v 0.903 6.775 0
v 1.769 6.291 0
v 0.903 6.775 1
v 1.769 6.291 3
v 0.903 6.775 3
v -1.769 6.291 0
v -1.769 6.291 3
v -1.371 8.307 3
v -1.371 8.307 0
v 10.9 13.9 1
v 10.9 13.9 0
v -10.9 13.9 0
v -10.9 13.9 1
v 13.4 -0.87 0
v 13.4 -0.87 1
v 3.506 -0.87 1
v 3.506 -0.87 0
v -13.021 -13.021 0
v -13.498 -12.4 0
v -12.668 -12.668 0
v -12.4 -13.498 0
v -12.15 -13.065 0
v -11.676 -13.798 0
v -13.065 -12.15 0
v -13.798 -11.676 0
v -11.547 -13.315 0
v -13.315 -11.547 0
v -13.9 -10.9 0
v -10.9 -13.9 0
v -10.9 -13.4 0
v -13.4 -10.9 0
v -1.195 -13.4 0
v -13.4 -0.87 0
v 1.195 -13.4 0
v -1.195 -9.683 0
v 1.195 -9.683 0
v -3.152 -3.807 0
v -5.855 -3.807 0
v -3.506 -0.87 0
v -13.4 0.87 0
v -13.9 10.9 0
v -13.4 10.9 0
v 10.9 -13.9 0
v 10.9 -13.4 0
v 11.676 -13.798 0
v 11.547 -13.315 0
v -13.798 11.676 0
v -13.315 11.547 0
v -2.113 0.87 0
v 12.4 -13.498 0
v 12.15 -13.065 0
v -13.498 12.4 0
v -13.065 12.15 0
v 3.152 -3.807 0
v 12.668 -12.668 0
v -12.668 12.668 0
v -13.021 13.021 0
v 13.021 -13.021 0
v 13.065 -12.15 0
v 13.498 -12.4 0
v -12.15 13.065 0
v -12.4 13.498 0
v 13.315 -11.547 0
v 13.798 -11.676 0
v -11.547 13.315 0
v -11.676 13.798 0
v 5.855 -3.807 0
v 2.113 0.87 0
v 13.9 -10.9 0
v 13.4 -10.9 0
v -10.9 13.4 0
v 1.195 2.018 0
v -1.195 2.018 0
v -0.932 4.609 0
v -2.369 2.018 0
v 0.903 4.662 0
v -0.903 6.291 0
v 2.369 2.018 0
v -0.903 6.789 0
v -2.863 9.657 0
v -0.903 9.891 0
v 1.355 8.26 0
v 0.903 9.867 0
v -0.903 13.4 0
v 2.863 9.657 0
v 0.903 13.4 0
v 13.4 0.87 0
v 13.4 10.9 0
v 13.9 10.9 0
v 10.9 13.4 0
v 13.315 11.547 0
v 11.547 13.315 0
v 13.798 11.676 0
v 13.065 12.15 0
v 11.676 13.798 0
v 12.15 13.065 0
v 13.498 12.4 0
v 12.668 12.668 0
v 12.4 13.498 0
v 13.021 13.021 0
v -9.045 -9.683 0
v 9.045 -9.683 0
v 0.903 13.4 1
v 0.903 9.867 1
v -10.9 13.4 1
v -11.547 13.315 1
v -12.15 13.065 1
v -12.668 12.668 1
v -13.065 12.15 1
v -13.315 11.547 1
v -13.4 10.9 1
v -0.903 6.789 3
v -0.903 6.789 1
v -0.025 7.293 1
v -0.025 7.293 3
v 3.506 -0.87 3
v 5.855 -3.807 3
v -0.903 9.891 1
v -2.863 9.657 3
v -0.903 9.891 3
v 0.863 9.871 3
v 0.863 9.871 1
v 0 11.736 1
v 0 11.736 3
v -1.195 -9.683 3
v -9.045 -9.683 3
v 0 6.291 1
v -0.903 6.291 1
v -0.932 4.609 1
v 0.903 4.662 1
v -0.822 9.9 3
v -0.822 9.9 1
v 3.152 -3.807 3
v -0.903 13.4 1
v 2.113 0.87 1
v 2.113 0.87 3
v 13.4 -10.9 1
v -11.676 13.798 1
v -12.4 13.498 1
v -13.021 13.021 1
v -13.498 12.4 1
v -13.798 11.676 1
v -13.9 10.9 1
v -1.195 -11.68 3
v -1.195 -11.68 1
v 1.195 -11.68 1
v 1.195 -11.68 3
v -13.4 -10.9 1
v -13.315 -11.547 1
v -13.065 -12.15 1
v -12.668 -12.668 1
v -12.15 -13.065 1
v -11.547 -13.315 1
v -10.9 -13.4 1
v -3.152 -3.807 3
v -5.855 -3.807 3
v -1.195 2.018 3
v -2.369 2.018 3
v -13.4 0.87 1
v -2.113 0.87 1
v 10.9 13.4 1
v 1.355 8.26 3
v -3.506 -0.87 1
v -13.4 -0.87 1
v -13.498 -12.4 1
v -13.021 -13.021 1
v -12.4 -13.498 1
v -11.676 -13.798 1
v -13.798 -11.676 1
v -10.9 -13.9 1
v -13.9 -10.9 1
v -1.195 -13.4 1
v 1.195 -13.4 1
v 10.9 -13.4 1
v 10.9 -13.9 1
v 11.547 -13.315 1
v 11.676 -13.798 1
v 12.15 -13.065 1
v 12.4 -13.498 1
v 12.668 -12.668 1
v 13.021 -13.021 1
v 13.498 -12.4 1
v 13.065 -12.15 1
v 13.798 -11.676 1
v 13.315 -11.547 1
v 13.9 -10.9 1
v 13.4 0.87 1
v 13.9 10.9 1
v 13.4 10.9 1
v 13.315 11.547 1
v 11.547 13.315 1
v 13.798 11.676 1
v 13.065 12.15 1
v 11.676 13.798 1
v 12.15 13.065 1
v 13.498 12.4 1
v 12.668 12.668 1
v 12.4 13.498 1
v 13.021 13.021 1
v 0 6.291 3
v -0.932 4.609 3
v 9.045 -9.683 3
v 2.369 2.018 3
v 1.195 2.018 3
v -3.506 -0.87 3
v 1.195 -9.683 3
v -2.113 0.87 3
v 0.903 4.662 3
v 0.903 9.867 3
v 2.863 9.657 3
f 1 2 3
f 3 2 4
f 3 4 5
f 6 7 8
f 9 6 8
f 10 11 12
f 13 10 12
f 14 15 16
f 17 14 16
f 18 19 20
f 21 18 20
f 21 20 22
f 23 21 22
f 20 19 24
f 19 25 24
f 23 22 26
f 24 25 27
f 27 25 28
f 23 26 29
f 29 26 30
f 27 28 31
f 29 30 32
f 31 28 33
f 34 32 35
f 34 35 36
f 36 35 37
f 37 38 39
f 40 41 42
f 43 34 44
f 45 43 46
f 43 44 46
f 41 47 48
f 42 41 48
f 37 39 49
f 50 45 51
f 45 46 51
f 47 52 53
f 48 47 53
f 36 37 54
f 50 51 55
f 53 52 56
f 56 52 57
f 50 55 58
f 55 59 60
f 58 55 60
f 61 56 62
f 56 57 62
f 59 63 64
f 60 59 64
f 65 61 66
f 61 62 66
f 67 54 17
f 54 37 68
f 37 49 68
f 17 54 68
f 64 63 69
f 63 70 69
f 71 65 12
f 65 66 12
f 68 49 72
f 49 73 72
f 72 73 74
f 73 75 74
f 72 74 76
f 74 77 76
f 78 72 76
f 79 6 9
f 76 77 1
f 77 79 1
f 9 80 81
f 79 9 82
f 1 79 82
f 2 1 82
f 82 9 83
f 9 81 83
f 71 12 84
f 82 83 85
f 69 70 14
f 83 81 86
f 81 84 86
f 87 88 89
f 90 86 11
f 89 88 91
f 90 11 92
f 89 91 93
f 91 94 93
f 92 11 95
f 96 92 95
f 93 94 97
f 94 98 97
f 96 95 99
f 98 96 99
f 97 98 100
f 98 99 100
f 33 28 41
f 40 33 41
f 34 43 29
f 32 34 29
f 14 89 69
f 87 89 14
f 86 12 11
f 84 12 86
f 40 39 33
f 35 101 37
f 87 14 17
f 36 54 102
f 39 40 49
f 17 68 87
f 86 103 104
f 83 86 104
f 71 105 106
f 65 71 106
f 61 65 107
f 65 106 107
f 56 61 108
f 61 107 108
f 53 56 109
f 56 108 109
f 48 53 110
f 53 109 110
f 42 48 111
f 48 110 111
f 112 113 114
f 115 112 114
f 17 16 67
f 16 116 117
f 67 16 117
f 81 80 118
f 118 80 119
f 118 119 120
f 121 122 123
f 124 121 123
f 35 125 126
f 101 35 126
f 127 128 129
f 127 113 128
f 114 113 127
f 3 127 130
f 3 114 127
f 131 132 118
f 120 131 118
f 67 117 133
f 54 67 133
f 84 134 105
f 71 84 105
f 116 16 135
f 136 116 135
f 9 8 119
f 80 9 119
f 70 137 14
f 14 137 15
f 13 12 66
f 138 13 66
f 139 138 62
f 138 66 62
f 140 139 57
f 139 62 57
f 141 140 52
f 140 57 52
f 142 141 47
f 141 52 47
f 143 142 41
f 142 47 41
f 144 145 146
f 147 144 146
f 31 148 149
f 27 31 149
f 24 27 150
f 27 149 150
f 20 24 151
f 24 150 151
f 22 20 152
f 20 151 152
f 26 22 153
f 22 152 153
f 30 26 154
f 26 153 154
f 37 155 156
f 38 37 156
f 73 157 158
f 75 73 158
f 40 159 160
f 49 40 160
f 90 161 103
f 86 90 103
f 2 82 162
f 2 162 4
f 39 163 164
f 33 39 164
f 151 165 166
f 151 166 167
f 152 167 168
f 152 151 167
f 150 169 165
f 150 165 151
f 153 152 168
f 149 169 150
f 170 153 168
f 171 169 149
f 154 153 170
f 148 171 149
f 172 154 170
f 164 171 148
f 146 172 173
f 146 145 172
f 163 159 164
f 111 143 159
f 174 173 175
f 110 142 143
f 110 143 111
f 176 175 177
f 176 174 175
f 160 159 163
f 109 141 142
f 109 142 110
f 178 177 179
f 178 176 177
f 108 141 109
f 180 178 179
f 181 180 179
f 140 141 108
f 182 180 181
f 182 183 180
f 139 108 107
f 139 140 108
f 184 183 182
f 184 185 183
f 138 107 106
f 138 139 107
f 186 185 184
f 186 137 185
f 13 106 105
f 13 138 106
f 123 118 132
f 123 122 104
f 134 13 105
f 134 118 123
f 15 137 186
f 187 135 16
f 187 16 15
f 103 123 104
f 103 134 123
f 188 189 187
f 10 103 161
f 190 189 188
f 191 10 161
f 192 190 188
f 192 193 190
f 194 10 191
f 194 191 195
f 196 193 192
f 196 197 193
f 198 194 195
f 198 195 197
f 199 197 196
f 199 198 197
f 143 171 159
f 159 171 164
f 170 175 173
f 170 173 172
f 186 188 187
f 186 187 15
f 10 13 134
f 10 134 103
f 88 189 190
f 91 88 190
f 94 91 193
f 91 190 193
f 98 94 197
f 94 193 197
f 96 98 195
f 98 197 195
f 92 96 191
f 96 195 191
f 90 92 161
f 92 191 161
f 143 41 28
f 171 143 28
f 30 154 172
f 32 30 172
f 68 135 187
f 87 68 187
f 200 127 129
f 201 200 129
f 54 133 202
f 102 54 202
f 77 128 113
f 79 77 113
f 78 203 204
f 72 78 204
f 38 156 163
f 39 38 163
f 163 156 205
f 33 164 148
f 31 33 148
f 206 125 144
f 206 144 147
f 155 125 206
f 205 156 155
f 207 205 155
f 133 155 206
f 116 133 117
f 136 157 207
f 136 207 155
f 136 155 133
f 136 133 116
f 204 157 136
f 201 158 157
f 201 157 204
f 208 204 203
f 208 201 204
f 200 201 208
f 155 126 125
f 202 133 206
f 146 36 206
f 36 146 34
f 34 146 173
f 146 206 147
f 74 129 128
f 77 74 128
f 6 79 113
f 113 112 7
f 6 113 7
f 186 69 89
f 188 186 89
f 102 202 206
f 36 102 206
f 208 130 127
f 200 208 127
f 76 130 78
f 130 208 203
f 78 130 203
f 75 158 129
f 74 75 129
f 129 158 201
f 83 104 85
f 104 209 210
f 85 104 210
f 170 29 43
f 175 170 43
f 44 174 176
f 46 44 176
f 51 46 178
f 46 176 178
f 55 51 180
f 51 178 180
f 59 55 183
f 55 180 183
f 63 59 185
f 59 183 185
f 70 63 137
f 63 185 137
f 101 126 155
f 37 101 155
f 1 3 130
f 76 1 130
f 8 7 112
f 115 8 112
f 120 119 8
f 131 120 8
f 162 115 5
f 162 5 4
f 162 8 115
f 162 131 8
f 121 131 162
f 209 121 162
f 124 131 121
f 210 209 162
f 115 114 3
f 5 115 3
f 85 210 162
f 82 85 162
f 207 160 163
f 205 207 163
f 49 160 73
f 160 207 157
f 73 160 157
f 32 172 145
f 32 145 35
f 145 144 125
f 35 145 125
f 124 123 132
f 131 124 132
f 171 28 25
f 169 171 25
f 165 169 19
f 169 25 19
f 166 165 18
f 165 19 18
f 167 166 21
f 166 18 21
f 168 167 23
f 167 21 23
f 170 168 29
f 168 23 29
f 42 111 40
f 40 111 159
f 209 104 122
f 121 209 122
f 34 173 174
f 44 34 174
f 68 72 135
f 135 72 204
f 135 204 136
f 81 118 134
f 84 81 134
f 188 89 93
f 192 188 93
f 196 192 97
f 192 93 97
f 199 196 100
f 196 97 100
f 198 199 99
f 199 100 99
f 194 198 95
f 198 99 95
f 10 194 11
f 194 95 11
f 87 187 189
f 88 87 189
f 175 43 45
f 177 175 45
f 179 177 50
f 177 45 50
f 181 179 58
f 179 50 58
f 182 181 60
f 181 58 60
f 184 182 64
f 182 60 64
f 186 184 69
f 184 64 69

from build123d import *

# Parameters (mm, degrees)
F1_DEPTH = 1
F3_DEPTH = 2
F4_DEPTH = 25


# Not quite as in the source:
# - a feature names something its author has since deleted; it is built from what else it names


with BuildPart() as f1:
    # F0 (on Top) → F1 (new body)
    with BuildSketch(Plane.XY):
        with BuildLine():
            ThreePointArc((-10.9, 13.9), (-13.0213203436, 13.0213203436), (-13.9, 10.9))
            Line((-13.9, 10.9), (-13.9, -10.9))
            ThreePointArc((-13.9, -10.9), (-13.0213203436, -13.0213203436), (-10.9, -13.9))
            Line((-10.9, -13.9), (10.9, -13.9))
            ThreePointArc((10.9, -13.9), (13.0213203436, -13.0213203436), (13.9, -10.9))
            Line((13.9, -10.9), (13.9, 10.9))
            ThreePointArc((13.9, 10.9), (13.0213203436, 13.0213203436), (10.9, 13.9))
            Line((10.9, 13.9), (-10.9, 13.9))
        make_face()
    extrude(amount=F1_DEPTH)

    # F2 (on face) → F3 (join)
    with BuildSketch(Plane.XY.offset(1)):
        Polygon((-0.8220698815, 9.9003828379), (-0.9031134541, 9.8906987285), (-2.8628115953, 9.6565292491), (-1.3706095432, 8.3073079855), (-1.7693148693, 6.2910923774), (-0.9031134541, 6.7887921262), (-0.0250134015, 7.2933285631), (0.9031134541, 6.7749159991), (1.7693148693, 6.2910923774), (1.3551504109, 8.2597296685), (2.8628115953, 9.6565292491), (0.9031134541, 9.8666282056), (0.8625424153, 9.8709778209), (0, 11.7364836228), align=None)
        Polygon((-1.1949065374, 2.0178125706), (-2.11299252, 0.8704443462), (2.11299252, 0.8704443462), (1.1949065374, 2.0178125706), (2.3687703069, 2.0178125706), (0.9031134541, 4.6618687775), (0, 6.2910923774), (-0.9324762655, 4.6088980406), (-2.3687703069, 2.0178125706), align=None)
        Polygon((3.5059938878, -0.8704443462), (-3.5059938878, -0.8704443462), (-5.8554494827, -3.8066515699), (-3.1518915202, -3.8066515699), (-9.0449256822, -9.6830716357), (-1.1949065374, -9.6830716357), (-1.1949065374, -11.6795562208), (0, -11.6795562208), (1.1949065374, -11.6795562208), (1.1949065374, -9.6830716357), (9.0449256822, -9.6830716357), (3.1518915202, -3.8066515699), (5.8554494827, -3.8066515699), align=None)
        Polygon((2.11299252, 0.8704443462), (-2.11299252, 0.8704443462), (-3.5059938878, -0.8704443462), (3.5059938878, -0.8704443462), align=None)
    extrude(amount=F3_DEPTH)

    # F2 (on face) → F4 (cut)
    with BuildSketch(Plane.XY.offset(1)):
        with BuildLine():
            ThreePointArc((-10.9, 13.4), (-12.667766953, 12.667766953), (-13.4, 10.9))
            Line((-13.4, 10.9), (-13.4, 0.8704443462))
            Line((-13.4, 0.8704443462), (-2.11299252, 0.8704443462))
            Line((-2.11299252, 0.8704443462), (-1.1949065374, 2.0178125706))
            Line((-1.1949065374, 2.0178125706), (-2.3687703069, 2.0178125706))
            Line((-2.3687703069, 2.0178125706), (-0.9324762655, 4.6088980406))
            Line((-0.9324762655, 4.6088980406), (-0.9031134541, 6.2910923774))
            Line((-0.9031134541, 6.2910923774), (-0.9031134541, 6.7887921262))
            Line((-0.9031134541, 6.7887921262), (-1.7693148693, 6.2910923774))
            Line((-1.7693148693, 6.2910923774), (-1.3706095432, 8.3073079855))
            Line((-1.3706095432, 8.3073079855), (-2.8628115953, 9.6565292491))
            Line((-2.8628115953, 9.6565292491), (-0.9031134541, 9.8906987285))
            Line((-0.9031134541, 9.8906987285), (-0.9031134541, 13.4))
            Line((-0.9031134541, 13.4), (-10.9, 13.4))
        make_face()
        with BuildLine():
            Line((1.1949065374, 2.0178125706), (2.11299252, 0.8704443462))
            Line((2.11299252, 0.8704443462), (13.4, 0.8704443462))
            Line((13.4, 0.8704443462), (13.4, 10.9))
            ThreePointArc((13.4, 10.9), (12.667766953, 12.667766953), (10.9, 13.4))
            Line((10.9, 13.4), (0.9031134541, 13.4))
            Line((0.9031134541, 13.4), (0.9031134541, 9.8666282056))
            Line((0.9031134541, 9.8666282056), (2.8628115953, 9.6565292491))
            Line((2.8628115953, 9.6565292491), (1.3551504109, 8.2597296685))
            Line((1.3551504109, 8.2597296685), (1.7693148693, 6.2910923774))
            Line((1.7693148693, 6.2910923774), (0.9031134541, 6.7749159991))
            Line((0.9031134541, 6.7749159991), (0.9031134541, 6.2910923774))
            Line((0.9031134541, 6.2910923774), (0.9031134541, 4.6618687775))
            Line((0.9031134541, 4.6618687775), (2.3687703069, 2.0178125706))
            Line((2.3687703069, 2.0178125706), (1.1949065374, 2.0178125706))
        make_face()
        with BuildLine():
            Line((-3.5059938878, -0.8704443462), (-13.4, -0.8704443462))
            Line((-13.4, -0.8704443462), (-13.4, -10.9))
            ThreePointArc((-13.4, -10.9), (-12.667766953, -12.667766953), (-10.9, -13.4))
            Line((-10.9, -13.4), (-1.1949065374, -13.4))
            Line((-1.1949065374, -13.4), (-1.1949065374, -11.6795562208))
            Line((-1.1949065374, -11.6795562208), (-1.1949065374, -9.6830716357))
            Line((-1.1949065374, -9.6830716357), (-9.0449256822, -9.6830716357))
            Line((-9.0449256822, -9.6830716357), (-3.1518915202, -3.8066515699))
            Line((-3.1518915202, -3.8066515699), (-5.8554494827, -3.8066515699))
            Line((-5.8554494827, -3.8066515699), (-3.5059938878, -0.8704443462))
        make_face()
        with BuildLine():
            Line((13.4, -0.8704443462), (3.5059938878, -0.8704443462))
            Line((3.5059938878, -0.8704443462), (5.8554494827, -3.8066515699))
            Line((5.8554494827, -3.8066515699), (3.1518915202, -3.8066515699))
            Line((3.1518915202, -3.8066515699), (9.0449256822, -9.6830716357))
            Line((9.0449256822, -9.6830716357), (1.1949065374, -9.6830716357))
            Line((1.1949065374, -9.6830716357), (1.1949065374, -11.6795562208))
            Line((1.1949065374, -11.6795562208), (1.1949065374, -13.4))
            Line((1.1949065374, -13.4), (10.9, -13.4))
            ThreePointArc((10.9, -13.4), (12.667766953, -12.667766953), (13.4, -10.9))
            Line((13.4, -10.9), (13.4, -0.8704443462))
        make_face()
    extrude(amount=-F4_DEPTH, mode=Mode.SUBTRACT)


solid = f1.part
